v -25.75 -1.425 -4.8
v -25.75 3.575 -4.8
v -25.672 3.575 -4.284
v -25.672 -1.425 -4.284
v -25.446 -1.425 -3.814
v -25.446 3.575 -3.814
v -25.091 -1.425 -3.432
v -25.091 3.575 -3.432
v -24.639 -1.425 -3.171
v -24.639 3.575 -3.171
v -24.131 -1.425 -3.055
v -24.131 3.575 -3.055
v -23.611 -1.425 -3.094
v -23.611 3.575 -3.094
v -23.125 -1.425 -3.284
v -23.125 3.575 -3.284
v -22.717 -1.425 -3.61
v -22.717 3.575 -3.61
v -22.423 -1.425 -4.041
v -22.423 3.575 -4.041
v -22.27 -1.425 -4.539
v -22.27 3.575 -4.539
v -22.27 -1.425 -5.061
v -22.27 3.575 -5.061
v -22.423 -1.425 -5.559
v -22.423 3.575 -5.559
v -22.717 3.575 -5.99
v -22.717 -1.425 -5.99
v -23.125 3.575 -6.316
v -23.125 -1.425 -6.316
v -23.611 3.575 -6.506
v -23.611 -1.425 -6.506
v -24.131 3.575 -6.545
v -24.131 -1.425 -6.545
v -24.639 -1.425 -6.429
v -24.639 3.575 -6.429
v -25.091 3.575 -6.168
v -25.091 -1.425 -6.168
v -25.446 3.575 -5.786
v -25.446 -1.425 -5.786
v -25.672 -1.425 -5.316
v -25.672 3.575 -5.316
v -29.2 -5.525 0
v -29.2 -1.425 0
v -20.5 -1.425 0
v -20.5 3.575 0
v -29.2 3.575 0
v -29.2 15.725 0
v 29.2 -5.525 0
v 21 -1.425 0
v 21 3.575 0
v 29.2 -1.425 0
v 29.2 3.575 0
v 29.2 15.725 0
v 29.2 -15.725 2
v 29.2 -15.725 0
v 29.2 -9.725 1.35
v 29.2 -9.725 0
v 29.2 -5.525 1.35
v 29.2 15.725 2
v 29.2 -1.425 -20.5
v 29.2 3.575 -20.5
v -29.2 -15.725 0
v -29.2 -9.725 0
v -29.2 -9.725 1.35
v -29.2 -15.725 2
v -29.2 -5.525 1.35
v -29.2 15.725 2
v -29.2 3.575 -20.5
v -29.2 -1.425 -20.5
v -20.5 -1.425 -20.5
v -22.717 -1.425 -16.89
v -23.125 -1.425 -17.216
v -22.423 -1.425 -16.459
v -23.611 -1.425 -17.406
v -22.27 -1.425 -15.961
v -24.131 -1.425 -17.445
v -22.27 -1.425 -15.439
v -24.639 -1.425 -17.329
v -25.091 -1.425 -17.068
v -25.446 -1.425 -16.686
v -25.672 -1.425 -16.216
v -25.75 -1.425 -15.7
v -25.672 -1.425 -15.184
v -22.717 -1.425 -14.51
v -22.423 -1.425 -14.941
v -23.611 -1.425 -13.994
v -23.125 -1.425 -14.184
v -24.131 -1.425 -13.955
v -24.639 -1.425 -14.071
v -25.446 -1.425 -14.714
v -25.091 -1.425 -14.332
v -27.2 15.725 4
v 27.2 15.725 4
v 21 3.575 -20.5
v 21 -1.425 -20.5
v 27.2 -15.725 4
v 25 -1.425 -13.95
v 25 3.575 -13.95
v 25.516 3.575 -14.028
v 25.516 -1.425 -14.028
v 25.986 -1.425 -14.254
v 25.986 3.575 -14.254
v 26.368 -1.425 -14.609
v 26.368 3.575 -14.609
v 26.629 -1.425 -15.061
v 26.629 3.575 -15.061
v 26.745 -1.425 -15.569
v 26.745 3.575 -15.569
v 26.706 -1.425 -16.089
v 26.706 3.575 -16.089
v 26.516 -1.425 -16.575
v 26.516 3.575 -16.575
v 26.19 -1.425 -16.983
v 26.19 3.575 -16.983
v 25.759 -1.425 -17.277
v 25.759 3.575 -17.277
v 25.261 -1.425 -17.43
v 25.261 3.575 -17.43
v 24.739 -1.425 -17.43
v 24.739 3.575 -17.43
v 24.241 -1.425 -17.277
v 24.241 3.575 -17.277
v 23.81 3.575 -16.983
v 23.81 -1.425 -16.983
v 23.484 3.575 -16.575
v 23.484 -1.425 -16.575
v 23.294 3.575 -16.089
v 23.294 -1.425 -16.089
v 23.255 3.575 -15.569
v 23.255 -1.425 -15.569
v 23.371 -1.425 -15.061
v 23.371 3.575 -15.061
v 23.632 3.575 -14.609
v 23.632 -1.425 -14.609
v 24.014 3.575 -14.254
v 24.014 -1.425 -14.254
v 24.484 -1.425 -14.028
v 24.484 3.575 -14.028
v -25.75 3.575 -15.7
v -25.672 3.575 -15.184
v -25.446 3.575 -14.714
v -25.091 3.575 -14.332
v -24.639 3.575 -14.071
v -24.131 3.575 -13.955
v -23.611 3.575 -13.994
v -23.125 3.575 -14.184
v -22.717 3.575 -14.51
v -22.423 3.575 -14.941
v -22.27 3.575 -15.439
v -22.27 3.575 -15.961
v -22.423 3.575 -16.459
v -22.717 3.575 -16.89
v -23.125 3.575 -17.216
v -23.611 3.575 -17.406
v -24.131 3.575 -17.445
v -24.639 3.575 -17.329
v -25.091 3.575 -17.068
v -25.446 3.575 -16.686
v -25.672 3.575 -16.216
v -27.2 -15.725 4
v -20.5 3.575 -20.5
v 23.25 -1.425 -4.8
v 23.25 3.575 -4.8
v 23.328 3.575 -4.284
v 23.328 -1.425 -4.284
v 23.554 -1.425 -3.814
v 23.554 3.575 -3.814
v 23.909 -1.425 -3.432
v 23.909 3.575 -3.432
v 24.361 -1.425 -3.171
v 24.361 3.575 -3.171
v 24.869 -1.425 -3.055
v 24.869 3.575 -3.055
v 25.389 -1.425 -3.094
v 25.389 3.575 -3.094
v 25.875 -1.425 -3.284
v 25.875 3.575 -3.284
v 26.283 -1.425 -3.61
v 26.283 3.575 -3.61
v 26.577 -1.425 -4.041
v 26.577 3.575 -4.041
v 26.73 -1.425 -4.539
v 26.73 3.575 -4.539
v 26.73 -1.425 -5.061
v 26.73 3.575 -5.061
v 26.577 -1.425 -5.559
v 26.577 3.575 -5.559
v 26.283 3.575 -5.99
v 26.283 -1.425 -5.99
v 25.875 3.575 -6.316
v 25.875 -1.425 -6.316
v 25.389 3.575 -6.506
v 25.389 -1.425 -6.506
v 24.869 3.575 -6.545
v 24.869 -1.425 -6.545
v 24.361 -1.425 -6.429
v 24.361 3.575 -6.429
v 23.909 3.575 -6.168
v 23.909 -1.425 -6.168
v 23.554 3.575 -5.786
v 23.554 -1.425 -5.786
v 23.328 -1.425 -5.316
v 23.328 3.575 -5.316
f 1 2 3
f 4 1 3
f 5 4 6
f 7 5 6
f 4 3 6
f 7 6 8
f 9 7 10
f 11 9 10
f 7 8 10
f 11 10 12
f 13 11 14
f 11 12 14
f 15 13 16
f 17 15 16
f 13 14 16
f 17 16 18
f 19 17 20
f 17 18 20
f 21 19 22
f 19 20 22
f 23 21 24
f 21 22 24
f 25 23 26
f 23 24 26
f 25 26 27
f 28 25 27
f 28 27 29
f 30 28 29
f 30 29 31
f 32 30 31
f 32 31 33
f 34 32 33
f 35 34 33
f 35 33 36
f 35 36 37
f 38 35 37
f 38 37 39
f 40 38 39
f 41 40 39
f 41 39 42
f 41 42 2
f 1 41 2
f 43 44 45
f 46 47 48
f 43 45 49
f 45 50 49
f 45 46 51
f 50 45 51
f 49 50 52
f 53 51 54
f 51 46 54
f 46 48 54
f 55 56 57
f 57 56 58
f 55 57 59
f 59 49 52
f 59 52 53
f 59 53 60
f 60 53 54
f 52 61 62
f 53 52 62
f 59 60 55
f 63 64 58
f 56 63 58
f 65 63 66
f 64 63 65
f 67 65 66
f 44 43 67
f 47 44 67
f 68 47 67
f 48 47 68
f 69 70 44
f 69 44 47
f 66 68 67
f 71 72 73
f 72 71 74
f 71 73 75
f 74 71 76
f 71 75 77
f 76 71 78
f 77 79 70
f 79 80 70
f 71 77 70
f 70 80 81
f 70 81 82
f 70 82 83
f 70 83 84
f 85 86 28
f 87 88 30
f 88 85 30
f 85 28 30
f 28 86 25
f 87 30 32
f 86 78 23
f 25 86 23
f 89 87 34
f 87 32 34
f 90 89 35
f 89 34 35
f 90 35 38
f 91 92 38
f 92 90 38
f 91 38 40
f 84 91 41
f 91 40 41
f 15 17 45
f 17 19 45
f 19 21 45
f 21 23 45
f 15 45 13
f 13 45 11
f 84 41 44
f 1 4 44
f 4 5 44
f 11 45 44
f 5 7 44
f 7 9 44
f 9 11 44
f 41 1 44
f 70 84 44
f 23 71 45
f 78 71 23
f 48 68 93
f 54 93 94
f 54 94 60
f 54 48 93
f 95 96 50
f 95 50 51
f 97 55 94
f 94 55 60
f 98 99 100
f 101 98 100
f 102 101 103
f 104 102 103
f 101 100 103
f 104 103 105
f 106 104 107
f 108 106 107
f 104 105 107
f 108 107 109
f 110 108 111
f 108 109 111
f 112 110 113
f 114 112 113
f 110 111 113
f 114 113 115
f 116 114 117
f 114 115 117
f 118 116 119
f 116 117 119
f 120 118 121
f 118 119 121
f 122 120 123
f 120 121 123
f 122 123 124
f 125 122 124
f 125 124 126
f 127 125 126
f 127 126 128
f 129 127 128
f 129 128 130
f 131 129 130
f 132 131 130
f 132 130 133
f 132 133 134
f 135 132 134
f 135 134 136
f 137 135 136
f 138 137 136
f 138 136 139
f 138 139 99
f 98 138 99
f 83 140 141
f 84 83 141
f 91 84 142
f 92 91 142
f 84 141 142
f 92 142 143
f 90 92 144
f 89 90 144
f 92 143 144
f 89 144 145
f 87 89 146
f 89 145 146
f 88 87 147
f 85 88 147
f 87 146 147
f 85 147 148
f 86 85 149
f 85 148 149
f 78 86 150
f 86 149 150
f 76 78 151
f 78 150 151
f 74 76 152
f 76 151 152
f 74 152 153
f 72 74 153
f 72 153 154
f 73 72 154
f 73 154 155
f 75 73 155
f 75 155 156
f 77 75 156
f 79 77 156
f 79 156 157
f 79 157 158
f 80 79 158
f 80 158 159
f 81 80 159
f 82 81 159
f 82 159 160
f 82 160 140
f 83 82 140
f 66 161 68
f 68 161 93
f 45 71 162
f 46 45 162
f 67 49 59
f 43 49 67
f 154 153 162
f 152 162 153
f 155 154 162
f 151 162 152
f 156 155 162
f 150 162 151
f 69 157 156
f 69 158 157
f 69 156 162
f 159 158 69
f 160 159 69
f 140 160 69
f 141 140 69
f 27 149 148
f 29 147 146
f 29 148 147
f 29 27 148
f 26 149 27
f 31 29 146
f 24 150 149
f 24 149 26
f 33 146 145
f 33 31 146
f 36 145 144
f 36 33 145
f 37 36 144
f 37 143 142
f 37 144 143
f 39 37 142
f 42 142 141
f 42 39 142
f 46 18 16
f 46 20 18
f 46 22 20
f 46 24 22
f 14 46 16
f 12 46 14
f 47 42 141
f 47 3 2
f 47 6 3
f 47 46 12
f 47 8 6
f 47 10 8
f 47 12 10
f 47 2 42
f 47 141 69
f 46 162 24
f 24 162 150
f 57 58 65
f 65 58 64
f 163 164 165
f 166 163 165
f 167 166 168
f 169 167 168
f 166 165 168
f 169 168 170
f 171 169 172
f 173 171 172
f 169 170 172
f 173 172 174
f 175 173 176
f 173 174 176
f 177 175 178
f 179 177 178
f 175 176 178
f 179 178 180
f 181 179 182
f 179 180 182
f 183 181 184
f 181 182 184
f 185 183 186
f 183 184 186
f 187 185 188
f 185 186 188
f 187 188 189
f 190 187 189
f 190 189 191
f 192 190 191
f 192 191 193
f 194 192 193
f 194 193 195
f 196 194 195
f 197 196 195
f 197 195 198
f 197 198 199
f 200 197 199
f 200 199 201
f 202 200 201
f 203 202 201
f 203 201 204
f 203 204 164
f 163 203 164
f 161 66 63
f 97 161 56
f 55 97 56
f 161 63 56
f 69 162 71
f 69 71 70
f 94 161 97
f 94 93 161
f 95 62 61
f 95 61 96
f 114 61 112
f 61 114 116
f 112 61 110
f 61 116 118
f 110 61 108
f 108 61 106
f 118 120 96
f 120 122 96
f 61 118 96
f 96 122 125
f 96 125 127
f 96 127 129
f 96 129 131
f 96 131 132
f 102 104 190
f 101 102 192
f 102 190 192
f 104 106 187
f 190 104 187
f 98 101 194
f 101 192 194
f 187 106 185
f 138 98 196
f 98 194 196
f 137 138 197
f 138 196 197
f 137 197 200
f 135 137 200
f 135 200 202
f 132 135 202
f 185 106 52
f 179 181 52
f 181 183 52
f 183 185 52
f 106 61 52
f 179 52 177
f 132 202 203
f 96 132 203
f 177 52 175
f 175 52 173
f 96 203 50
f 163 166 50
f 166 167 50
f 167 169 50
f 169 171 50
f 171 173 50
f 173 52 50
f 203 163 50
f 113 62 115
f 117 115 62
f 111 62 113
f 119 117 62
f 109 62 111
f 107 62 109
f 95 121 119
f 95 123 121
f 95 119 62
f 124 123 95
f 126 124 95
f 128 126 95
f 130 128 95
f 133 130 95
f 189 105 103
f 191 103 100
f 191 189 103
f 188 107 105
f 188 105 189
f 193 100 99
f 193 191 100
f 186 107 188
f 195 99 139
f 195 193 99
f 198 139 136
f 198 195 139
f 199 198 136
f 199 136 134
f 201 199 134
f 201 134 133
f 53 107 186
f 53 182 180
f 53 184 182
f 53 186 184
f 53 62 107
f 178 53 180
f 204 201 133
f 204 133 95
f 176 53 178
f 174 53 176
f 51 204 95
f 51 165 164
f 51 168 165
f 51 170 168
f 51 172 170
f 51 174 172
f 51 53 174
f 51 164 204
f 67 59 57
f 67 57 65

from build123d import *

# Parameters (mm, degrees)
SZKIC1_W                    = 58.4
SZKIC1_H                    = 31.45
DODANIE_WYCI_GNI_CIE1_DEPTH = 4
SZKIC2_W                    = 8.2
SZKIC2_H                    = 5
SZKIC2_W_2                  = 8.7
DODANIE_WYCI_GNI_CIE2_DEPTH = 20.5
WYTNIJ_WYCI_GNI_CIE1_REACH  = 42.563
SZKIC3_R                    = 1.75
SZKIC5_W                    = 58.4
SZKIC5_H                    = 4.2
WYTNIJ_WYCI_GNI_CIE2_DEPTH  = 1.35
SFAZOWANIE1_SIZE            = 2


with BuildPart() as part:
    # Szkic1 → Dodanie-wyciągnięcie1 (new body)
    with BuildSketch(Plane.XY):
        Rectangle(SZKIC1_W, SZKIC1_H)
    extrude(amount=DODANIE_WYCI_GNI_CIE1_DEPTH)

    # Szkic2 → Dodanie-wyciągnięcie2 (add)
    with BuildSketch(Plane(origin=(0, 0, 0), x_dir=(-1, 0, 0), z_dir=(0, 0, -1))):
        with Locations((-25.1, 1.075)):
            Rectangle(SZKIC2_W, SZKIC2_H)
        with Locations((24.85, 1.075)):
            Rectangle(SZKIC2_W_2, SZKIC2_H)
    extrude(amount=DODANIE_WYCI_GNI_CIE2_DEPTH)

    # Szkic3 → Wytnij-wyciągnięcie1 (cut, up to next)
    with BuildSketch(Plane(origin=(0, 3.575, 0), x_dir=(1, 0, 0), z_dir=(0, 1, 0)), mode=Mode.PRIVATE) as wytnij_wyci_gni_cie1_sk1:
        with Locations(Location((25, 4.8, 0), (0, 0, 180))):
            Circle(SZKIC3_R)
    wytnij_wyci_gni_cie1_tool1 = extrude(wytnij_wyci_gni_cie1_sk1.sketch, amount=-WYTNIJ_WYCI_GNI_CIE1_REACH, mode=Mode.PRIVATE) & part.part
    # Szkic3 → Wytnij-wyciągnięcie1 (cut, up to next)
    with BuildSketch(Plane(origin=(0, 3.575, 0), x_dir=(1, 0, 0), z_dir=(0, 1, 0)), mode=Mode.PRIVATE) as wytnij_wyci_gni_cie1_sk2:
        with Locations(Location((-24, 4.8, 0), (0, 0, 180))):
            Circle(SZKIC3_R)
    wytnij_wyci_gni_cie1_tool2 = extrude(wytnij_wyci_gni_cie1_sk2.sketch, amount=-WYTNIJ_WYCI_GNI_CIE1_REACH, mode=Mode.PRIVATE) & part.part
    # Szkic3 → Wytnij-wyciągnięcie1 (cut, up to next)
    with BuildSketch(Plane(origin=(0, 3.575, 0), x_dir=(1, 0, 0), z_dir=(0, 1, 0)), mode=Mode.PRIVATE) as wytnij_wyci_gni_cie1_sk3:
        with Locations(Location((25, 15.7, 0), (0, 0, 270))):
            Circle(SZKIC3_R)
    wytnij_wyci_gni_cie1_tool3 = extrude(wytnij_wyci_gni_cie1_sk3.sketch, amount=-WYTNIJ_WYCI_GNI_CIE1_REACH, mode=Mode.PRIVATE) & part.part
    # Szkic3 → Wytnij-wyciągnięcie1 (cut, up to next)
    with BuildSketch(Plane(origin=(0, 3.575, 0), x_dir=(1, 0, 0), z_dir=(0, 1, 0)), mode=Mode.PRIVATE) as wytnij_wyci_gni_cie1_sk4:
        with Locations(Location((-24, 15.7, 0), (0, 0, 180))):
            Circle(SZKIC3_R)
    wytnij_wyci_gni_cie1_tool4 = extrude(wytnij_wyci_gni_cie1_sk4.sketch, amount=-WYTNIJ_WYCI_GNI_CIE1_REACH, mode=Mode.PRIVATE) & part.part
    add(wytnij_wyci_gni_cie1_tool1.solids().sort_by_distance((25, 3.575, -4.8))[0], mode=Mode.SUBTRACT)
    add(wytnij_wyci_gni_cie1_tool2.solids().sort_by_distance((-24, 3.575, -4.8))[0], mode=Mode.SUBTRACT)
    add(wytnij_wyci_gni_cie1_tool3.solids().sort_by_distance((25, 3.575, -15.7))[0], mode=Mode.SUBTRACT)
    add(wytnij_wyci_gni_cie1_tool4.solids().sort_by_distance((-24, 3.575, -15.7))[0], mode=Mode.SUBTRACT)

    # Szkic5 → Wytnij-wyciągnięcie2 (cut)
    with BuildSketch(Plane(origin=(0, 0, 0), x_dir=(-1, 0, 0), z_dir=(0, 0, -1))):
        with Locations((0, -7.625)):
            Rectangle(SZKIC5_W, SZKIC5_H)
    extrude(amount=-WYTNIJ_WYCI_GNI_CIE2_DEPTH, mode=Mode.SUBTRACT)

    # Sfazowanie1
    sfazowanie1_edges = [part.edges().sort_by_distance(p)[0] for p in [
        (-29.2, 0, 4),
        (29.2, 0, 4),
    ]]
    chamfer(sfazowanie1_edges, length=SFAZOWANIE1_SIZE)


solid = part.part
